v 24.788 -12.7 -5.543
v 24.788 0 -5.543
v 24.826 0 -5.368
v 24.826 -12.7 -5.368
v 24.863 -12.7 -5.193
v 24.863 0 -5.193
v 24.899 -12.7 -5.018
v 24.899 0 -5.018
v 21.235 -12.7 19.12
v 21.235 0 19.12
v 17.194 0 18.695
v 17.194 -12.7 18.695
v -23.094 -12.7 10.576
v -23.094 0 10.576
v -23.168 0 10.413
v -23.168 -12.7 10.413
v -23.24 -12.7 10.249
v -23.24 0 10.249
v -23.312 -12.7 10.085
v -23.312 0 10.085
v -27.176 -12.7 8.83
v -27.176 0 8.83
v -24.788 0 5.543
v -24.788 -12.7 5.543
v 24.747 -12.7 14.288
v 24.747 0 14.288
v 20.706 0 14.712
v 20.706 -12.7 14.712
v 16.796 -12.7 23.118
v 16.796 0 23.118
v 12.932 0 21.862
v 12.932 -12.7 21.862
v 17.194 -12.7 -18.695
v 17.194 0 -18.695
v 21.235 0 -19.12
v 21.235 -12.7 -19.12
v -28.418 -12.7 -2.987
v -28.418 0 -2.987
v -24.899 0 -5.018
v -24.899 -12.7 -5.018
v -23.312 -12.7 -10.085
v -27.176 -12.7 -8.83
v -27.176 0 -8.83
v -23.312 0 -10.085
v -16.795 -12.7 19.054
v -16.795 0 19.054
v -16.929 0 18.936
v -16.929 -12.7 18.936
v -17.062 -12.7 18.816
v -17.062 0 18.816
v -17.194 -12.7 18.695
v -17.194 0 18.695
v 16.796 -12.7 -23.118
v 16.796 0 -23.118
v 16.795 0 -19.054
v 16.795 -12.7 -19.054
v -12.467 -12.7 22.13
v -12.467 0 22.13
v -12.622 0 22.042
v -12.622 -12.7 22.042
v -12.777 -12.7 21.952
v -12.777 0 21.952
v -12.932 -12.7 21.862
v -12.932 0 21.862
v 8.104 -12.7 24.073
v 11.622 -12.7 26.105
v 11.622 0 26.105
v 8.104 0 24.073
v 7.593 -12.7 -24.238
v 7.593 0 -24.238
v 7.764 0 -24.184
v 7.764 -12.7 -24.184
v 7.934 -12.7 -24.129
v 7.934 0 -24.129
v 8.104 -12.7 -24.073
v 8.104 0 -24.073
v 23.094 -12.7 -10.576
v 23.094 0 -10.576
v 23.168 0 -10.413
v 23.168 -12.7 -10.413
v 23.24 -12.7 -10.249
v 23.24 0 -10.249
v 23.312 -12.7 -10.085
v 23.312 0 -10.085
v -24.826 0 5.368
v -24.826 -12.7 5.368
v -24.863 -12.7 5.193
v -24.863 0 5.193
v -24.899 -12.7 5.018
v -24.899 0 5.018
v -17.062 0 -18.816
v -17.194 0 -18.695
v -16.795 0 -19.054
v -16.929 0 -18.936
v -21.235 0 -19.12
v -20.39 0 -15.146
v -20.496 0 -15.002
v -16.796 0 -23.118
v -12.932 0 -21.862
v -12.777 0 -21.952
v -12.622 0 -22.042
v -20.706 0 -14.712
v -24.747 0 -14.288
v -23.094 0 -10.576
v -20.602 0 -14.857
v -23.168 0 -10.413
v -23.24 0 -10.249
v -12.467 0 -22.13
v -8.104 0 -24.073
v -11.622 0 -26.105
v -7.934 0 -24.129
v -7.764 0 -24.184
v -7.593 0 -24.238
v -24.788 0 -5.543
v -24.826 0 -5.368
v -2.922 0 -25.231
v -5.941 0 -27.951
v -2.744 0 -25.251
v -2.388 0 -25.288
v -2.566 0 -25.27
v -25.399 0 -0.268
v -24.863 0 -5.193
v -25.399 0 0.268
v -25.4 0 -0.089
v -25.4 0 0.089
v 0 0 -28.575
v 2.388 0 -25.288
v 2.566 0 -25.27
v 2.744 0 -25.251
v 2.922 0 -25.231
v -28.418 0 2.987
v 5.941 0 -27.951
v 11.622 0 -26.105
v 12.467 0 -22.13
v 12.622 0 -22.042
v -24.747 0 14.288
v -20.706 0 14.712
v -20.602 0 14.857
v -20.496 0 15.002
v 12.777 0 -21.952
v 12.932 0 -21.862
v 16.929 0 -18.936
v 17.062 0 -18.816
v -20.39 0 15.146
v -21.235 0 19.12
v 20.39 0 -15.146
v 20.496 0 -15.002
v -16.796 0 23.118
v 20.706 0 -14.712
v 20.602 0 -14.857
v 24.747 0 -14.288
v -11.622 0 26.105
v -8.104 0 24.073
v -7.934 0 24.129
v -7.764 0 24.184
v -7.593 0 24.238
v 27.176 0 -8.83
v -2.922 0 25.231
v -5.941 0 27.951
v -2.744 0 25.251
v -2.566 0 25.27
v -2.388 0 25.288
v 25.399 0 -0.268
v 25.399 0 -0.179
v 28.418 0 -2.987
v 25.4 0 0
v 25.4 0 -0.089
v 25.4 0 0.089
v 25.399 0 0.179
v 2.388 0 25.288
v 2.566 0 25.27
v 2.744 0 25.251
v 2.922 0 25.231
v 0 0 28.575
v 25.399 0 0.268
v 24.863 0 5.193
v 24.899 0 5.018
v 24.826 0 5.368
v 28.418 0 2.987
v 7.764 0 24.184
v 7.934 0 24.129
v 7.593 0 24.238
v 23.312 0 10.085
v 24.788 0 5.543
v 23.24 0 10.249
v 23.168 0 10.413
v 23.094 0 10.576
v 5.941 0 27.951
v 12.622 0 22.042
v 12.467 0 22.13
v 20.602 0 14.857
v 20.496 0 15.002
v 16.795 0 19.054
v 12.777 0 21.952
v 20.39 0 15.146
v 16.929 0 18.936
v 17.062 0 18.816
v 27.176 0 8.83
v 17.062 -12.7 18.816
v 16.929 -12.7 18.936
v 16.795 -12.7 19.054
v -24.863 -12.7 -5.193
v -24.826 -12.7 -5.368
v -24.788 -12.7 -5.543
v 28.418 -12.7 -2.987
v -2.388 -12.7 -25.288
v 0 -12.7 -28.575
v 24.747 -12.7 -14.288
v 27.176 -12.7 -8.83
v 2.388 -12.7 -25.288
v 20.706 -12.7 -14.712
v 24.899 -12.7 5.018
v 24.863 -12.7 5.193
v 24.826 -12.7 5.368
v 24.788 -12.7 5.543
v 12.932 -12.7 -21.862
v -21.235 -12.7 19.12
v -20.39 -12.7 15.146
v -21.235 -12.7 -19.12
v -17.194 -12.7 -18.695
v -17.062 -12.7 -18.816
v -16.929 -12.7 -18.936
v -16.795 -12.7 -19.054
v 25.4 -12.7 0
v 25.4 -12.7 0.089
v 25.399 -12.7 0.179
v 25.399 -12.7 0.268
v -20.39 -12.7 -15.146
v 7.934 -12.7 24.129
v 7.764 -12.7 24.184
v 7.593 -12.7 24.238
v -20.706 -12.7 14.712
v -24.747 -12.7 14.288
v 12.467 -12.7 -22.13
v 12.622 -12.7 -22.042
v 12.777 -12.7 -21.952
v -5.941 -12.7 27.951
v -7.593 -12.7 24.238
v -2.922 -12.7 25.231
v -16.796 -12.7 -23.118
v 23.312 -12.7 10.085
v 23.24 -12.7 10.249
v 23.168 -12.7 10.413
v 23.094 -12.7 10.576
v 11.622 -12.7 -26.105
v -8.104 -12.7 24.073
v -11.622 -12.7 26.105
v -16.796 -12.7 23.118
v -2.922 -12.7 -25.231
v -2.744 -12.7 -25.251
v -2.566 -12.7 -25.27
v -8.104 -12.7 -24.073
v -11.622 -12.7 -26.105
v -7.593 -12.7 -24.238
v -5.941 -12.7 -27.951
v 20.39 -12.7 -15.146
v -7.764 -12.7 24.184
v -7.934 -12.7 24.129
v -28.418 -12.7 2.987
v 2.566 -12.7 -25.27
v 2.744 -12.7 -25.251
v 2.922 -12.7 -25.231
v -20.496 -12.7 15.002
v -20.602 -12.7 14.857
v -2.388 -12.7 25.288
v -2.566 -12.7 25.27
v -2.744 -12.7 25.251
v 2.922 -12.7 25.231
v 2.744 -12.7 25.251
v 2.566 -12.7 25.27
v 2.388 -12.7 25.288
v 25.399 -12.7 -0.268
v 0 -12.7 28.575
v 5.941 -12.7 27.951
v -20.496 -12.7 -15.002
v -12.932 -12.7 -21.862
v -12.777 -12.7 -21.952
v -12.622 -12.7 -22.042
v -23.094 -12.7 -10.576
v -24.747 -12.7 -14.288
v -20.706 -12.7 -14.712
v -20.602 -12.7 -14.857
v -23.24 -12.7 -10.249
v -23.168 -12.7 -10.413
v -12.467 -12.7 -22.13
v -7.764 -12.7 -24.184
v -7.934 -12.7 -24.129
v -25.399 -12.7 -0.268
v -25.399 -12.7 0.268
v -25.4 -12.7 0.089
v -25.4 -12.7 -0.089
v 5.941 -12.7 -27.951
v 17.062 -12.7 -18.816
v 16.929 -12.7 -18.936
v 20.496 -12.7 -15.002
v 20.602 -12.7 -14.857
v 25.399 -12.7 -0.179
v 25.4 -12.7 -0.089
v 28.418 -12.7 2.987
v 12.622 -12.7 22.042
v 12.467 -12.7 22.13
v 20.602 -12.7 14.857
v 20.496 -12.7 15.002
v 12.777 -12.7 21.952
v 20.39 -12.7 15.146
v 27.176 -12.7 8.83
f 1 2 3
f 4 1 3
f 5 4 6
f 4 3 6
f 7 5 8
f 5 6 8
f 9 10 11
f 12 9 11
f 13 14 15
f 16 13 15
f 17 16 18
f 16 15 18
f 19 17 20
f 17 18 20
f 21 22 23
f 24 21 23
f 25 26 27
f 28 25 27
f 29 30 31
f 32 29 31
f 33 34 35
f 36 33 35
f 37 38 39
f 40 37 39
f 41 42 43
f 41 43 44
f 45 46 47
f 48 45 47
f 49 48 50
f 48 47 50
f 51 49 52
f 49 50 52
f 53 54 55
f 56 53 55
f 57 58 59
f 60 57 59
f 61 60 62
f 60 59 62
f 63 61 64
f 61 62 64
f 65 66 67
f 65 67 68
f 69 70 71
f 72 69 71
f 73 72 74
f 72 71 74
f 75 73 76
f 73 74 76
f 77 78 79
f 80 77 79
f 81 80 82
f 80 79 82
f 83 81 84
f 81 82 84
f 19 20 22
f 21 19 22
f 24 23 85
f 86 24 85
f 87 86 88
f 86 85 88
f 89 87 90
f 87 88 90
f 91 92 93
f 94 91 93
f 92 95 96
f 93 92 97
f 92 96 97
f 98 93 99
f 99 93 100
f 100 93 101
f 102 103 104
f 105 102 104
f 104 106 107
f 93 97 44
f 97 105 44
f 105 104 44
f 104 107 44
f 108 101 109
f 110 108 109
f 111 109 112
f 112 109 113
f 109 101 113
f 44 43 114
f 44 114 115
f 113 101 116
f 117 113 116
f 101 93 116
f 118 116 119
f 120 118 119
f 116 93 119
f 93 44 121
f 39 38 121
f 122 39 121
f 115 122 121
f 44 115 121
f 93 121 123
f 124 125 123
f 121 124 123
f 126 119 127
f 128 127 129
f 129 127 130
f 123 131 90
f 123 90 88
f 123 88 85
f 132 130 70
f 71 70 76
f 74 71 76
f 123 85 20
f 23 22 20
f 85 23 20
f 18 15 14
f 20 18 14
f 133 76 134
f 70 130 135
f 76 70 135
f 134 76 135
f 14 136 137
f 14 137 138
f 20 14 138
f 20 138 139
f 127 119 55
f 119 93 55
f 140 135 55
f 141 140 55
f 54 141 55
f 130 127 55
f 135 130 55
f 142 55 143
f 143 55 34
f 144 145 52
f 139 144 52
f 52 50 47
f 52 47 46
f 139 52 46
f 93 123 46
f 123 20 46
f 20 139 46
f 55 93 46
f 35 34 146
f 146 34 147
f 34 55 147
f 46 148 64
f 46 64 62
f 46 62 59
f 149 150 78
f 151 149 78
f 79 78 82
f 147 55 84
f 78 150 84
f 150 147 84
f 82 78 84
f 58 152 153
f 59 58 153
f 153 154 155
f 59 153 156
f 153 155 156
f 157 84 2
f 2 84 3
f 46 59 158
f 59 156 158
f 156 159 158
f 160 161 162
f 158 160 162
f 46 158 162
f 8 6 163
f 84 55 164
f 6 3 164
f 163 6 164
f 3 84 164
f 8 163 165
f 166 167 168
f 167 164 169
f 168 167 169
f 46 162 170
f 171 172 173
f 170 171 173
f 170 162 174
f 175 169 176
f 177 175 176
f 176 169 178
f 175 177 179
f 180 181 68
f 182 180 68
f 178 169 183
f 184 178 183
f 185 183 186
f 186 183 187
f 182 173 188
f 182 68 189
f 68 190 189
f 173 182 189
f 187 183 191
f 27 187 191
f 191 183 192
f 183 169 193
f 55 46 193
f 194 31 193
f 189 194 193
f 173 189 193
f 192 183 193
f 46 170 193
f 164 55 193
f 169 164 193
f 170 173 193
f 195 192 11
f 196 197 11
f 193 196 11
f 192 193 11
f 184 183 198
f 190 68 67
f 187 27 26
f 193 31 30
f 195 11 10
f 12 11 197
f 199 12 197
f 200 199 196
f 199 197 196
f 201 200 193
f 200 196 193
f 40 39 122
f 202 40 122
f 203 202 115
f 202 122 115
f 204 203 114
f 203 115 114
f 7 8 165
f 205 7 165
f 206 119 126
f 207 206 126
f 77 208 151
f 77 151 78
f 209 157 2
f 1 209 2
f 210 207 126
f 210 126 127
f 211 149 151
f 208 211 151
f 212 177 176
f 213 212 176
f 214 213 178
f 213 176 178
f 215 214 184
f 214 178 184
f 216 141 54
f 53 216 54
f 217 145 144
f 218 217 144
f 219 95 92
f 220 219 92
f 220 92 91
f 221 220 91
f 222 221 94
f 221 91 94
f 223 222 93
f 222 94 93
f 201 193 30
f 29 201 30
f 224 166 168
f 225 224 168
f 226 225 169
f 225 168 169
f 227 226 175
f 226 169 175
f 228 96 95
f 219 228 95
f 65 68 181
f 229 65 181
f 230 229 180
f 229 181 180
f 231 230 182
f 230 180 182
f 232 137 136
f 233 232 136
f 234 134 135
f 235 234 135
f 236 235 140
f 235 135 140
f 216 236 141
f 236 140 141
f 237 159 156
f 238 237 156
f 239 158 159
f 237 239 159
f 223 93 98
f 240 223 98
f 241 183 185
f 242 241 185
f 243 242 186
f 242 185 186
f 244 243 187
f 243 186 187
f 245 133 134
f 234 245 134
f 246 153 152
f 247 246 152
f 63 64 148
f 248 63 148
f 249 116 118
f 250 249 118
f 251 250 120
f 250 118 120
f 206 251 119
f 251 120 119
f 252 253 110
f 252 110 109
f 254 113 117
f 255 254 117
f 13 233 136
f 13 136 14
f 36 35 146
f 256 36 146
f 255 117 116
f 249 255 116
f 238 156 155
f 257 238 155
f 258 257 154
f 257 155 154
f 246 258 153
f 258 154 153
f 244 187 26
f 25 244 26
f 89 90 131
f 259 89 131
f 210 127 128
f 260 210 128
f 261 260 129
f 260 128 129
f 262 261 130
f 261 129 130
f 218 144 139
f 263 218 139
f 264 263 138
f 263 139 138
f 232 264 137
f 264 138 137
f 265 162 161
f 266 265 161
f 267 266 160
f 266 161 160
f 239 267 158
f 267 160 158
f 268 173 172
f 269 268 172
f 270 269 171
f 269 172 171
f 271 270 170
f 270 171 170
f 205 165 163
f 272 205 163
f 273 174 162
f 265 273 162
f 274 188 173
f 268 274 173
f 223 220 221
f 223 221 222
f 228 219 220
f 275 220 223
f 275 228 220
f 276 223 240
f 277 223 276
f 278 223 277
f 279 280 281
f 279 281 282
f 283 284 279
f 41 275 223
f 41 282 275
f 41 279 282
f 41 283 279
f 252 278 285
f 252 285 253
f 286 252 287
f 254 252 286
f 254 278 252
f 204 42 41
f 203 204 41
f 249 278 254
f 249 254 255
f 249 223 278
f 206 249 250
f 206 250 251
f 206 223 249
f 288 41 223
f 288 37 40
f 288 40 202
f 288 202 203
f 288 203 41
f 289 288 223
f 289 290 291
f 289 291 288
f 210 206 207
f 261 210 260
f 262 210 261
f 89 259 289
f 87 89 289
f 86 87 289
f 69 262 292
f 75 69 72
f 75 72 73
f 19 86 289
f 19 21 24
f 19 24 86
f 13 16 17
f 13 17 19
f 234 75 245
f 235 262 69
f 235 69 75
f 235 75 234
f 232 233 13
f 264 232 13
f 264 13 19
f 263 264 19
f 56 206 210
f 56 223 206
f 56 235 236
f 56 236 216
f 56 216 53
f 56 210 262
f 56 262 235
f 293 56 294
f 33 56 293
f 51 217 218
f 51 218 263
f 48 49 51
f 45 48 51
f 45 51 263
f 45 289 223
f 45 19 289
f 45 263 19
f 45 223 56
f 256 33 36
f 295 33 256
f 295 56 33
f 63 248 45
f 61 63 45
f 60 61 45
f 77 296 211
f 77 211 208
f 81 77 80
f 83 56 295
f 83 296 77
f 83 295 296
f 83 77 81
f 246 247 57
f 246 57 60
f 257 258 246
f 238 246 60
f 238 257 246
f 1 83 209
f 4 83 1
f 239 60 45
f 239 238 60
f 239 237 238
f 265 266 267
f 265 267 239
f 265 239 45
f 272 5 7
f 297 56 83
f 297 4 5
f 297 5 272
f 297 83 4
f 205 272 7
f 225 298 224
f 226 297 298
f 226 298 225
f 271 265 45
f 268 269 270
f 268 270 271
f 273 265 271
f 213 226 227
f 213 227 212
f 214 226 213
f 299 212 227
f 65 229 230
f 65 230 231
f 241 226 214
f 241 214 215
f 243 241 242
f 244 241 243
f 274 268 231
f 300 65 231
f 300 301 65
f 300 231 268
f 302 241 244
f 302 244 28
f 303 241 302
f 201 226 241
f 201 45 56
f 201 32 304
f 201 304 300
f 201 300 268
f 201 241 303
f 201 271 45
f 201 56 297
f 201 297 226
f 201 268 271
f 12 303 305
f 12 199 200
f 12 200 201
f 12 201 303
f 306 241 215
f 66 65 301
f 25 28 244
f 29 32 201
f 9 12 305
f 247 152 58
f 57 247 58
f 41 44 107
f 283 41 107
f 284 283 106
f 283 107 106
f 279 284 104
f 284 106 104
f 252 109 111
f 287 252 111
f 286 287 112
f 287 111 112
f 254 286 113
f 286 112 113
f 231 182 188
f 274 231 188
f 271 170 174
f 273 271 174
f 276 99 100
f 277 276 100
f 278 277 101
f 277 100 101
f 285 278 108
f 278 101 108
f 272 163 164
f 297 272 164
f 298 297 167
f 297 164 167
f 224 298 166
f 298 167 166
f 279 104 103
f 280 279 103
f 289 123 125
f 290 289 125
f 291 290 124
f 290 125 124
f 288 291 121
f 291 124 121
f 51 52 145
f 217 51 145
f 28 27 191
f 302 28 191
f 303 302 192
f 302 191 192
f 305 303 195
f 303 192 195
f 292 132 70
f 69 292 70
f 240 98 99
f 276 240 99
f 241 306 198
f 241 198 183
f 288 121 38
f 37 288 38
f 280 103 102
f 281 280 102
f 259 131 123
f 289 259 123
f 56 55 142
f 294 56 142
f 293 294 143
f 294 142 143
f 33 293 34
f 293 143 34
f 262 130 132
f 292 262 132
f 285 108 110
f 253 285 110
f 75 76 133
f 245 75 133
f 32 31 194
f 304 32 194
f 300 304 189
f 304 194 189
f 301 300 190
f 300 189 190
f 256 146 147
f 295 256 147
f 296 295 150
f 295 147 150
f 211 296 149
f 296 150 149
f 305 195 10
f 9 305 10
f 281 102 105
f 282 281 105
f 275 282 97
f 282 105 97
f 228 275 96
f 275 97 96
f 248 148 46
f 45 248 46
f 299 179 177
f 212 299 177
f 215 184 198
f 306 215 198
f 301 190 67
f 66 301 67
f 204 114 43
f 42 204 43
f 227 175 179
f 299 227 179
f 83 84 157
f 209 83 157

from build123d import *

# Parameters (mm, degrees)
F1_DEPTH = 12.7


with BuildPart() as f1:
    # F0 (on Front) → F1 (new body)
    with BuildSketch(Plane.XZ):
        with BuildLine():
            ThreePointArc((25.398581, -0.268477), (25.399645, -0.134241), (25.4, 0))
            ThreePointArc((25.4, 0), (25.399645, 0.134241), (25.398581, 0.268477))
            ThreePointArc((25.398581, 0.268477), (25.260856, 2.655023), (24.899381, 5.018052))
            ThreePointArc((24.899381, 5.018052), (24.844949, 5.280957), (24.787742, 5.543272))
            ThreePointArc((24.787742, 5.543272), (24.156836, 7.849032), (23.311958, 10.085267))
            ThreePointArc((23.311958, 10.085267), (23.204055, 10.331111), (23.093559, 10.5758))
            ThreePointArc((23.093559, 10.5758), (21.997045, 12.7), (20.705691, 14.711709))
            ThreePointArc((20.705691, 14.711709), (20.549032, 14.929745), (20.390077, 15.146114))
            ThreePointArc((20.390077, 15.146114), (18.875879, 16.995917), (17.194485, 18.695178))
            ThreePointArc((17.194485, 18.695178), (16.995917, 18.875879), (16.79545, 19.05447))
            ThreePointArc((16.79545, 19.05447), (14.929745, 20.549032), (12.931799, 21.861578))
            ThreePointArc((12.931799, 21.861578), (12.7, 21.997045), (12.466782, 22.130055))
            ThreePointArc((12.466782, 22.130055), (10.331111, 23.204055), (8.10393, 24.072522))
            ThreePointArc((8.10393, 24.072522), (7.849032, 24.156836), (7.593256, 24.23845))
            ThreePointArc((7.593256, 24.23845), (5.280957, 24.844949), (2.921881, 25.231381))
            ThreePointArc((2.921881, 25.231381), (2.655023, 25.260856), (2.387868, 25.287508))
            ThreePointArc((2.387868, 25.287508), (1.195258, 25.371862), (0, 25.4))
            ThreePointArc((0, 25.4), (-1.195258, 25.371862), (-2.387868, 25.287508))
            ThreePointArc((-2.387868, 25.287508), (-2.655023, 25.260856), (-2.921881, 25.231381))
            ThreePointArc((-2.921881, 25.231381), (-5.280957, 24.844949), (-7.593256, 24.23845))
            ThreePointArc((-7.593256, 24.23845), (-7.849032, 24.156836), (-8.10393, 24.072522))
            ThreePointArc((-8.10393, 24.072522), (-10.331111, 23.204055), (-12.466782, 22.130055))
            ThreePointArc((-12.466782, 22.130055), (-12.7, 21.997045), (-12.931799, 21.861578))
            ThreePointArc((-12.931799, 21.861578), (-14.929745, 20.549032), (-16.79545, 19.05447))
            ThreePointArc((-16.79545, 19.05447), (-16.995917, 18.875879), (-17.194485, 18.695178))
            ThreePointArc((-17.194485, 18.695178), (-18.875879, 16.995917), (-20.390077, 15.146114))
            ThreePointArc((-20.390077, 15.146114), (-20.549032, 14.929745), (-20.705691, 14.711709))
            ThreePointArc((-20.705691, 14.711709), (-21.997045, 12.7), (-23.093559, 10.5758))
            ThreePointArc((-23.093559, 10.5758), (-23.204055, 10.331111), (-23.311958, 10.085267))
            ThreePointArc((-23.311958, 10.085267), (-24.156836, 7.849032), (-24.787742, 5.543272))
            ThreePointArc((-24.787742, 5.543272), (-24.844949, 5.280957), (-24.899381, 5.018052))
            ThreePointArc((-24.899381, 5.018052), (-25.260856, 2.655023), (-25.398581, 0.268477))
            ThreePointArc((-25.398581, 0.268477), (-25.4, 0), (-25.398581, -0.268477))
            ThreePointArc((-25.398581, -0.268477), (-25.260856, -2.655023), (-24.899381, -5.018052))
            ThreePointArc((-24.899381, -5.018052), (-24.844949, -5.280957), (-24.787742, -5.543272))
            ThreePointArc((-24.787742, -5.543272), (-24.156836, -7.849032), (-23.311958, -10.085267))
            ThreePointArc((-23.311958, -10.085267), (-23.204055, -10.331111), (-23.093559, -10.5758))
            ThreePointArc((-23.093559, -10.5758), (-21.997045, -12.7), (-20.705691, -14.711709))
            ThreePointArc((-20.705691, -14.711709), (-20.549032, -14.929745), (-20.390077, -15.146114))
            ThreePointArc((-20.390077, -15.146114), (-18.875879, -16.995917), (-17.194485, -18.695178))
            ThreePointArc((-17.194485, -18.695178), (-16.995917, -18.875879), (-16.79545, -19.05447))
            ThreePointArc((-16.79545, -19.05447), (-14.929745, -20.549032), (-12.931799, -21.861578))
            ThreePointArc((-12.931799, -21.861578), (-12.7, -21.997045), (-12.466782, -22.130055))
            ThreePointArc((-12.466782, -22.130055), (-10.331111, -23.204055), (-8.10393, -24.072522))
            ThreePointArc((-8.10393, -24.072522), (-7.849032, -24.156836), (-7.593256, -24.23845))
            ThreePointArc((-7.593256, -24.23845), (-5.280957, -24.844949), (-2.921881, -25.231381))
            ThreePointArc((-2.921881, -25.231381), (-2.655023, -25.260856), (-2.387868, -25.287508))
            ThreePointArc((-2.387868, -25.287508), (0, -25.4), (2.387868, -25.287508))
            ThreePointArc((2.387868, -25.287508), (2.655023, -25.260856), (2.921881, -25.231381))
            ThreePointArc((2.921881, -25.231381), (5.280957, -24.844949), (7.593256, -24.23845))
            ThreePointArc((7.593256, -24.23845), (7.849032, -24.156836), (8.10393, -24.072522))
            ThreePointArc((8.10393, -24.072522), (10.331111, -23.204055), (12.466782, -22.130055))
            ThreePointArc((12.466782, -22.130055), (12.7, -21.997045), (12.931799, -21.861578))
            ThreePointArc((12.931799, -21.861578), (14.929745, -20.549032), (16.79545, -19.05447))
            ThreePointArc((16.79545, -19.05447), (16.995917, -18.875879), (17.194485, -18.695178))
            ThreePointArc((17.194485, -18.695178), (18.875879, -16.995917), (20.390077, -15.146114))
            ThreePointArc((20.390077, -15.146114), (20.549032, -14.929745), (20.705691, -14.711709))
            ThreePointArc((20.705691, -14.711709), (21.997045, -12.7), (23.093559, -10.5758))
            ThreePointArc((23.093559, -10.5758), (23.204055, -10.331111), (23.311958, -10.085267))
            ThreePointArc((23.311958, -10.085267), (24.156836, -7.849032), (24.787742, -5.543272))
            ThreePointArc((24.787742, -5.543272), (24.844949, -5.280957), (24.899381, -5.018052))
            ThreePointArc((24.899381, -5.018052), (25.260856, -2.655023), (25.398581, -0.268477))
        make_face()
        with BuildLine():
            ThreePointArc((17.194485, 18.695178), (18.875879, 16.995917), (20.390077, 15.146114))
            Line((20.390077, 15.146114), (21.235363, 19.120407))
            Line((21.235363, 19.120407), (17.194485, 18.695178))
        make_face()
        with BuildLine():
            ThreePointArc((12.931799, 21.861578), (14.929745, 20.549032), (16.79545, 19.05447))
            Line((16.79545, 19.05447), (16.795964, 23.117661))
            Line((16.795964, 23.117661), (12.931799, 21.861578))
        make_face()
        with BuildLine():
            ThreePointArc((8.10393, 24.072522), (10.331111, 23.204055), (12.466782, 22.130055))
            Line((12.466782, 22.130055), (11.6225, 26.104561))
            Line((11.6225, 26.104561), (8.10393, 24.072522))
        make_face()
        with BuildLine():
            ThreePointArc((2.921881, 25.231381), (5.280957, 24.844949), (7.593256, 24.23845))
            Line((7.593256, 24.23845), (5.941077, 27.950568))
            Line((5.941077, 27.950568), (2.921881, 25.231381))
        make_face()
        with BuildLine():
            ThreePointArc((0, 25.4), (1.195258, 25.371862), (2.387868, 25.287508))
            Line((2.387868, 25.287508), (0, 28.575))
            Line((0, 28.575), (0, 25.4))
        make_face()
        with BuildLine():
            ThreePointArc((20.705691, 14.711709), (21.997045, 12.7), (23.093559, 10.5758))
            Line((23.093559, 10.5758), (24.746676, 14.2875))
            Line((24.746676, 14.2875), (20.705691, 14.711709))
        make_face()
        with BuildLine():
            ThreePointArc((23.311958, 10.085267), (24.156836, 7.849032), (24.787742, 5.543272))
            Line((24.787742, 5.543272), (27.17644, 8.830161))
            Line((27.17644, 8.830161), (23.311958, 10.085267))
        make_face()
        with BuildLine():
            ThreePointArc((24.899381, 5.018052), (25.260856, 2.655023), (25.398581, 0.268477))
            Line((25.398581, 0.268477), (28.418463, 2.986901))
            Line((28.418463, 2.986901), (24.899381, 5.018052))
        make_face()
        with BuildLine():
            Line((28.418463, -2.986901), (25.398581, -0.268477))
            ThreePointArc((25.398581, -0.268477), (25.260856, -2.655023), (24.899381, -5.018052))
            Line((24.899381, -5.018052), (28.418463, -2.986901))
        make_face()
        with BuildLine():
            Line((27.17644, -8.830161), (24.787742, -5.543272))
            ThreePointArc((24.787742, -5.543272), (24.156836, -7.849032), (23.311958, -10.085267))
            Line((23.311958, -10.085267), (27.17644, -8.830161))
        make_face()
        with BuildLine():
            Line((24.746676, -14.2875), (23.093559, -10.5758))
            ThreePointArc((23.093559, -10.5758), (21.997045, -12.7), (20.705691, -14.711709))
            Line((20.705691, -14.711709), (24.746676, -14.2875))
        make_face()
        with BuildLine():
            Line((21.235363, -19.120407), (20.390077, -15.146114))
            ThreePointArc((20.390077, -15.146114), (18.875879, -16.995917), (17.194485, -18.695178))
            Line((17.194485, -18.695178), (21.235363, -19.120407))
        make_face()
        with BuildLine():
            Line((16.795964, -23.117661), (16.79545, -19.05447))
            ThreePointArc((16.79545, -19.05447), (14.929745, -20.549032), (12.931799, -21.861578))
            Line((12.931799, -21.861578), (16.795964, -23.117661))
        make_face()
        with BuildLine():
            Line((11.6225, -26.104561), (12.466782, -22.130055))
            ThreePointArc((12.466782, -22.130055), (10.331111, -23.204055), (8.10393, -24.072522))
            Line((8.10393, -24.072522), (11.6225, -26.104561))
        make_face()
        with BuildLine():
            Line((5.941077, -27.950568), (7.593256, -24.23845))
            ThreePointArc((7.593256, -24.23845), (5.280957, -24.844949), (2.921881, -25.231381))
            Line((2.921881, -25.231381), (5.941077, -27.950568))
        make_face()
        with BuildLine():
            Line((0, -28.575), (2.387868, -25.287508))
            ThreePointArc((2.387868, -25.287508), (0, -25.4), (-2.387868, -25.287508))
            Line((-2.387868, -25.287508), (0, -28.575))
        make_face()
        with BuildLine():
            Line((-5.941077, -27.950568), (-2.921881, -25.231381))
            ThreePointArc((-2.921881, -25.231381), (-5.280957, -24.844949), (-7.593256, -24.23845))
            Line((-7.593256, -24.23845), (-5.941077, -27.950568))
        make_face()
        with BuildLine():
            Line((-11.6225, -26.104561), (-8.10393, -24.072522))
            ThreePointArc((-8.10393, -24.072522), (-10.331111, -23.204055), (-12.466782, -22.130055))
            Line((-12.466782, -22.130055), (-11.6225, -26.104561))
        make_face()
        with BuildLine():
            Line((-24.746676, -14.2875), (-20.705691, -14.711709))
            ThreePointArc((-20.705691, -14.711709), (-21.997045, -12.7), (-23.093559, -10.5758))
            Line((-23.093559, -10.5758), (-24.746676, -14.2875))
        make_face()
        with BuildLine():
            Line((-27.17644, -8.830161), (-23.311958, -10.085267))
            ThreePointArc((-23.311958, -10.085267), (-24.156836, -7.849032), (-24.787742, -5.543272))
            Line((-24.787742, -5.543272), (-27.17644, -8.830161))
        make_face()
        with BuildLine():
            Line((-28.418463, -2.986901), (-24.899381, -5.018052))
            ThreePointArc((-24.899381, -5.018052), (-25.260856, -2.655023), (-25.398581, -0.268477))
            Line((-25.398581, -0.268477), (-28.418463, -2.986901))
        make_face()
        with BuildLine():
            ThreePointArc((-25.398581, 0.268477), (-25.260856, 2.655023), (-24.899381, 5.018052))
            Line((-24.899381, 5.018052), (-28.418463, 2.986901))
            Line((-28.418463, 2.986901), (-25.398581, 0.268477))
        make_face()
        with BuildLine():
            ThreePointArc((-24.787742, 5.543272), (-24.156836, 7.849032), (-23.311958, 10.085267))
            Line((-23.311958, 10.085267), (-27.17644, 8.830161))
            Line((-27.17644, 8.830161), (-24.787742, 5.543272))
        make_face()
        with BuildLine():
            ThreePointArc((-23.093559, 10.5758), (-21.997045, 12.7), (-20.705691, 14.711709))
            Line((-20.705691, 14.711709), (-24.746676, 14.2875))
            Line((-24.746676, 14.2875), (-23.093559, 10.5758))
        make_face()
        with BuildLine():
            ThreePointArc((-20.390077, 15.146114), (-18.875879, 16.995917), (-17.194485, 18.695178))
            Line((-17.194485, 18.695178), (-21.235363, 19.120407))
            Line((-21.235363, 19.120407), (-20.390077, 15.146114))
        make_face()
        with BuildLine():
            ThreePointArc((-16.79545, 19.05447), (-14.929745, 20.549032), (-12.931799, 21.861578))
            Line((-12.931799, 21.861578), (-16.795964, 23.117661))
            Line((-16.795964, 23.117661), (-16.79545, 19.05447))
        make_face()
        with BuildLine():
            ThreePointArc((-12.466782, 22.130055), (-10.331111, 23.204055), (-8.10393, 24.072522))
            Line((-8.10393, 24.072522), (-11.6225, 26.104561))
            Line((-11.6225, 26.104561), (-12.466782, 22.130055))
        make_face()
        with BuildLine():
            ThreePointArc((-7.593256, 24.23845), (-5.280957, 24.844949), (-2.921881, 25.231381))
            Line((-2.921881, 25.231381), (-5.941077, 27.950568))
            Line((-5.941077, 27.950568), (-7.593256, 24.23845))
        make_face()
        with BuildLine():
            ThreePointArc((-2.387868, 25.287508), (-1.195258, 25.371862), (0, 25.4))
            Line((0, 25.4), (0, 28.575))
            Line((0, 28.575), (-2.387868, 25.287508))
        make_face()
        with BuildLine():
            Line((-16.795964, -23.117661), (-12.931799, -21.861578))
            ThreePointArc((-12.931799, -21.861578), (-14.929745, -20.549032), (-16.79545, -19.05447))
            Line((-16.79545, -19.05447), (-16.795964, -23.117661))
        make_face()
        with BuildLine():
            Line((-21.235363, -19.120407), (-17.194485, -18.695178))
            ThreePointArc((-17.194485, -18.695178), (-18.875879, -16.995917), (-20.390077, -15.146114))
            Line((-20.390077, -15.146114), (-21.235363, -19.120407))
        make_face()
    extrude(amount=F1_DEPTH)


solid = f1.part
